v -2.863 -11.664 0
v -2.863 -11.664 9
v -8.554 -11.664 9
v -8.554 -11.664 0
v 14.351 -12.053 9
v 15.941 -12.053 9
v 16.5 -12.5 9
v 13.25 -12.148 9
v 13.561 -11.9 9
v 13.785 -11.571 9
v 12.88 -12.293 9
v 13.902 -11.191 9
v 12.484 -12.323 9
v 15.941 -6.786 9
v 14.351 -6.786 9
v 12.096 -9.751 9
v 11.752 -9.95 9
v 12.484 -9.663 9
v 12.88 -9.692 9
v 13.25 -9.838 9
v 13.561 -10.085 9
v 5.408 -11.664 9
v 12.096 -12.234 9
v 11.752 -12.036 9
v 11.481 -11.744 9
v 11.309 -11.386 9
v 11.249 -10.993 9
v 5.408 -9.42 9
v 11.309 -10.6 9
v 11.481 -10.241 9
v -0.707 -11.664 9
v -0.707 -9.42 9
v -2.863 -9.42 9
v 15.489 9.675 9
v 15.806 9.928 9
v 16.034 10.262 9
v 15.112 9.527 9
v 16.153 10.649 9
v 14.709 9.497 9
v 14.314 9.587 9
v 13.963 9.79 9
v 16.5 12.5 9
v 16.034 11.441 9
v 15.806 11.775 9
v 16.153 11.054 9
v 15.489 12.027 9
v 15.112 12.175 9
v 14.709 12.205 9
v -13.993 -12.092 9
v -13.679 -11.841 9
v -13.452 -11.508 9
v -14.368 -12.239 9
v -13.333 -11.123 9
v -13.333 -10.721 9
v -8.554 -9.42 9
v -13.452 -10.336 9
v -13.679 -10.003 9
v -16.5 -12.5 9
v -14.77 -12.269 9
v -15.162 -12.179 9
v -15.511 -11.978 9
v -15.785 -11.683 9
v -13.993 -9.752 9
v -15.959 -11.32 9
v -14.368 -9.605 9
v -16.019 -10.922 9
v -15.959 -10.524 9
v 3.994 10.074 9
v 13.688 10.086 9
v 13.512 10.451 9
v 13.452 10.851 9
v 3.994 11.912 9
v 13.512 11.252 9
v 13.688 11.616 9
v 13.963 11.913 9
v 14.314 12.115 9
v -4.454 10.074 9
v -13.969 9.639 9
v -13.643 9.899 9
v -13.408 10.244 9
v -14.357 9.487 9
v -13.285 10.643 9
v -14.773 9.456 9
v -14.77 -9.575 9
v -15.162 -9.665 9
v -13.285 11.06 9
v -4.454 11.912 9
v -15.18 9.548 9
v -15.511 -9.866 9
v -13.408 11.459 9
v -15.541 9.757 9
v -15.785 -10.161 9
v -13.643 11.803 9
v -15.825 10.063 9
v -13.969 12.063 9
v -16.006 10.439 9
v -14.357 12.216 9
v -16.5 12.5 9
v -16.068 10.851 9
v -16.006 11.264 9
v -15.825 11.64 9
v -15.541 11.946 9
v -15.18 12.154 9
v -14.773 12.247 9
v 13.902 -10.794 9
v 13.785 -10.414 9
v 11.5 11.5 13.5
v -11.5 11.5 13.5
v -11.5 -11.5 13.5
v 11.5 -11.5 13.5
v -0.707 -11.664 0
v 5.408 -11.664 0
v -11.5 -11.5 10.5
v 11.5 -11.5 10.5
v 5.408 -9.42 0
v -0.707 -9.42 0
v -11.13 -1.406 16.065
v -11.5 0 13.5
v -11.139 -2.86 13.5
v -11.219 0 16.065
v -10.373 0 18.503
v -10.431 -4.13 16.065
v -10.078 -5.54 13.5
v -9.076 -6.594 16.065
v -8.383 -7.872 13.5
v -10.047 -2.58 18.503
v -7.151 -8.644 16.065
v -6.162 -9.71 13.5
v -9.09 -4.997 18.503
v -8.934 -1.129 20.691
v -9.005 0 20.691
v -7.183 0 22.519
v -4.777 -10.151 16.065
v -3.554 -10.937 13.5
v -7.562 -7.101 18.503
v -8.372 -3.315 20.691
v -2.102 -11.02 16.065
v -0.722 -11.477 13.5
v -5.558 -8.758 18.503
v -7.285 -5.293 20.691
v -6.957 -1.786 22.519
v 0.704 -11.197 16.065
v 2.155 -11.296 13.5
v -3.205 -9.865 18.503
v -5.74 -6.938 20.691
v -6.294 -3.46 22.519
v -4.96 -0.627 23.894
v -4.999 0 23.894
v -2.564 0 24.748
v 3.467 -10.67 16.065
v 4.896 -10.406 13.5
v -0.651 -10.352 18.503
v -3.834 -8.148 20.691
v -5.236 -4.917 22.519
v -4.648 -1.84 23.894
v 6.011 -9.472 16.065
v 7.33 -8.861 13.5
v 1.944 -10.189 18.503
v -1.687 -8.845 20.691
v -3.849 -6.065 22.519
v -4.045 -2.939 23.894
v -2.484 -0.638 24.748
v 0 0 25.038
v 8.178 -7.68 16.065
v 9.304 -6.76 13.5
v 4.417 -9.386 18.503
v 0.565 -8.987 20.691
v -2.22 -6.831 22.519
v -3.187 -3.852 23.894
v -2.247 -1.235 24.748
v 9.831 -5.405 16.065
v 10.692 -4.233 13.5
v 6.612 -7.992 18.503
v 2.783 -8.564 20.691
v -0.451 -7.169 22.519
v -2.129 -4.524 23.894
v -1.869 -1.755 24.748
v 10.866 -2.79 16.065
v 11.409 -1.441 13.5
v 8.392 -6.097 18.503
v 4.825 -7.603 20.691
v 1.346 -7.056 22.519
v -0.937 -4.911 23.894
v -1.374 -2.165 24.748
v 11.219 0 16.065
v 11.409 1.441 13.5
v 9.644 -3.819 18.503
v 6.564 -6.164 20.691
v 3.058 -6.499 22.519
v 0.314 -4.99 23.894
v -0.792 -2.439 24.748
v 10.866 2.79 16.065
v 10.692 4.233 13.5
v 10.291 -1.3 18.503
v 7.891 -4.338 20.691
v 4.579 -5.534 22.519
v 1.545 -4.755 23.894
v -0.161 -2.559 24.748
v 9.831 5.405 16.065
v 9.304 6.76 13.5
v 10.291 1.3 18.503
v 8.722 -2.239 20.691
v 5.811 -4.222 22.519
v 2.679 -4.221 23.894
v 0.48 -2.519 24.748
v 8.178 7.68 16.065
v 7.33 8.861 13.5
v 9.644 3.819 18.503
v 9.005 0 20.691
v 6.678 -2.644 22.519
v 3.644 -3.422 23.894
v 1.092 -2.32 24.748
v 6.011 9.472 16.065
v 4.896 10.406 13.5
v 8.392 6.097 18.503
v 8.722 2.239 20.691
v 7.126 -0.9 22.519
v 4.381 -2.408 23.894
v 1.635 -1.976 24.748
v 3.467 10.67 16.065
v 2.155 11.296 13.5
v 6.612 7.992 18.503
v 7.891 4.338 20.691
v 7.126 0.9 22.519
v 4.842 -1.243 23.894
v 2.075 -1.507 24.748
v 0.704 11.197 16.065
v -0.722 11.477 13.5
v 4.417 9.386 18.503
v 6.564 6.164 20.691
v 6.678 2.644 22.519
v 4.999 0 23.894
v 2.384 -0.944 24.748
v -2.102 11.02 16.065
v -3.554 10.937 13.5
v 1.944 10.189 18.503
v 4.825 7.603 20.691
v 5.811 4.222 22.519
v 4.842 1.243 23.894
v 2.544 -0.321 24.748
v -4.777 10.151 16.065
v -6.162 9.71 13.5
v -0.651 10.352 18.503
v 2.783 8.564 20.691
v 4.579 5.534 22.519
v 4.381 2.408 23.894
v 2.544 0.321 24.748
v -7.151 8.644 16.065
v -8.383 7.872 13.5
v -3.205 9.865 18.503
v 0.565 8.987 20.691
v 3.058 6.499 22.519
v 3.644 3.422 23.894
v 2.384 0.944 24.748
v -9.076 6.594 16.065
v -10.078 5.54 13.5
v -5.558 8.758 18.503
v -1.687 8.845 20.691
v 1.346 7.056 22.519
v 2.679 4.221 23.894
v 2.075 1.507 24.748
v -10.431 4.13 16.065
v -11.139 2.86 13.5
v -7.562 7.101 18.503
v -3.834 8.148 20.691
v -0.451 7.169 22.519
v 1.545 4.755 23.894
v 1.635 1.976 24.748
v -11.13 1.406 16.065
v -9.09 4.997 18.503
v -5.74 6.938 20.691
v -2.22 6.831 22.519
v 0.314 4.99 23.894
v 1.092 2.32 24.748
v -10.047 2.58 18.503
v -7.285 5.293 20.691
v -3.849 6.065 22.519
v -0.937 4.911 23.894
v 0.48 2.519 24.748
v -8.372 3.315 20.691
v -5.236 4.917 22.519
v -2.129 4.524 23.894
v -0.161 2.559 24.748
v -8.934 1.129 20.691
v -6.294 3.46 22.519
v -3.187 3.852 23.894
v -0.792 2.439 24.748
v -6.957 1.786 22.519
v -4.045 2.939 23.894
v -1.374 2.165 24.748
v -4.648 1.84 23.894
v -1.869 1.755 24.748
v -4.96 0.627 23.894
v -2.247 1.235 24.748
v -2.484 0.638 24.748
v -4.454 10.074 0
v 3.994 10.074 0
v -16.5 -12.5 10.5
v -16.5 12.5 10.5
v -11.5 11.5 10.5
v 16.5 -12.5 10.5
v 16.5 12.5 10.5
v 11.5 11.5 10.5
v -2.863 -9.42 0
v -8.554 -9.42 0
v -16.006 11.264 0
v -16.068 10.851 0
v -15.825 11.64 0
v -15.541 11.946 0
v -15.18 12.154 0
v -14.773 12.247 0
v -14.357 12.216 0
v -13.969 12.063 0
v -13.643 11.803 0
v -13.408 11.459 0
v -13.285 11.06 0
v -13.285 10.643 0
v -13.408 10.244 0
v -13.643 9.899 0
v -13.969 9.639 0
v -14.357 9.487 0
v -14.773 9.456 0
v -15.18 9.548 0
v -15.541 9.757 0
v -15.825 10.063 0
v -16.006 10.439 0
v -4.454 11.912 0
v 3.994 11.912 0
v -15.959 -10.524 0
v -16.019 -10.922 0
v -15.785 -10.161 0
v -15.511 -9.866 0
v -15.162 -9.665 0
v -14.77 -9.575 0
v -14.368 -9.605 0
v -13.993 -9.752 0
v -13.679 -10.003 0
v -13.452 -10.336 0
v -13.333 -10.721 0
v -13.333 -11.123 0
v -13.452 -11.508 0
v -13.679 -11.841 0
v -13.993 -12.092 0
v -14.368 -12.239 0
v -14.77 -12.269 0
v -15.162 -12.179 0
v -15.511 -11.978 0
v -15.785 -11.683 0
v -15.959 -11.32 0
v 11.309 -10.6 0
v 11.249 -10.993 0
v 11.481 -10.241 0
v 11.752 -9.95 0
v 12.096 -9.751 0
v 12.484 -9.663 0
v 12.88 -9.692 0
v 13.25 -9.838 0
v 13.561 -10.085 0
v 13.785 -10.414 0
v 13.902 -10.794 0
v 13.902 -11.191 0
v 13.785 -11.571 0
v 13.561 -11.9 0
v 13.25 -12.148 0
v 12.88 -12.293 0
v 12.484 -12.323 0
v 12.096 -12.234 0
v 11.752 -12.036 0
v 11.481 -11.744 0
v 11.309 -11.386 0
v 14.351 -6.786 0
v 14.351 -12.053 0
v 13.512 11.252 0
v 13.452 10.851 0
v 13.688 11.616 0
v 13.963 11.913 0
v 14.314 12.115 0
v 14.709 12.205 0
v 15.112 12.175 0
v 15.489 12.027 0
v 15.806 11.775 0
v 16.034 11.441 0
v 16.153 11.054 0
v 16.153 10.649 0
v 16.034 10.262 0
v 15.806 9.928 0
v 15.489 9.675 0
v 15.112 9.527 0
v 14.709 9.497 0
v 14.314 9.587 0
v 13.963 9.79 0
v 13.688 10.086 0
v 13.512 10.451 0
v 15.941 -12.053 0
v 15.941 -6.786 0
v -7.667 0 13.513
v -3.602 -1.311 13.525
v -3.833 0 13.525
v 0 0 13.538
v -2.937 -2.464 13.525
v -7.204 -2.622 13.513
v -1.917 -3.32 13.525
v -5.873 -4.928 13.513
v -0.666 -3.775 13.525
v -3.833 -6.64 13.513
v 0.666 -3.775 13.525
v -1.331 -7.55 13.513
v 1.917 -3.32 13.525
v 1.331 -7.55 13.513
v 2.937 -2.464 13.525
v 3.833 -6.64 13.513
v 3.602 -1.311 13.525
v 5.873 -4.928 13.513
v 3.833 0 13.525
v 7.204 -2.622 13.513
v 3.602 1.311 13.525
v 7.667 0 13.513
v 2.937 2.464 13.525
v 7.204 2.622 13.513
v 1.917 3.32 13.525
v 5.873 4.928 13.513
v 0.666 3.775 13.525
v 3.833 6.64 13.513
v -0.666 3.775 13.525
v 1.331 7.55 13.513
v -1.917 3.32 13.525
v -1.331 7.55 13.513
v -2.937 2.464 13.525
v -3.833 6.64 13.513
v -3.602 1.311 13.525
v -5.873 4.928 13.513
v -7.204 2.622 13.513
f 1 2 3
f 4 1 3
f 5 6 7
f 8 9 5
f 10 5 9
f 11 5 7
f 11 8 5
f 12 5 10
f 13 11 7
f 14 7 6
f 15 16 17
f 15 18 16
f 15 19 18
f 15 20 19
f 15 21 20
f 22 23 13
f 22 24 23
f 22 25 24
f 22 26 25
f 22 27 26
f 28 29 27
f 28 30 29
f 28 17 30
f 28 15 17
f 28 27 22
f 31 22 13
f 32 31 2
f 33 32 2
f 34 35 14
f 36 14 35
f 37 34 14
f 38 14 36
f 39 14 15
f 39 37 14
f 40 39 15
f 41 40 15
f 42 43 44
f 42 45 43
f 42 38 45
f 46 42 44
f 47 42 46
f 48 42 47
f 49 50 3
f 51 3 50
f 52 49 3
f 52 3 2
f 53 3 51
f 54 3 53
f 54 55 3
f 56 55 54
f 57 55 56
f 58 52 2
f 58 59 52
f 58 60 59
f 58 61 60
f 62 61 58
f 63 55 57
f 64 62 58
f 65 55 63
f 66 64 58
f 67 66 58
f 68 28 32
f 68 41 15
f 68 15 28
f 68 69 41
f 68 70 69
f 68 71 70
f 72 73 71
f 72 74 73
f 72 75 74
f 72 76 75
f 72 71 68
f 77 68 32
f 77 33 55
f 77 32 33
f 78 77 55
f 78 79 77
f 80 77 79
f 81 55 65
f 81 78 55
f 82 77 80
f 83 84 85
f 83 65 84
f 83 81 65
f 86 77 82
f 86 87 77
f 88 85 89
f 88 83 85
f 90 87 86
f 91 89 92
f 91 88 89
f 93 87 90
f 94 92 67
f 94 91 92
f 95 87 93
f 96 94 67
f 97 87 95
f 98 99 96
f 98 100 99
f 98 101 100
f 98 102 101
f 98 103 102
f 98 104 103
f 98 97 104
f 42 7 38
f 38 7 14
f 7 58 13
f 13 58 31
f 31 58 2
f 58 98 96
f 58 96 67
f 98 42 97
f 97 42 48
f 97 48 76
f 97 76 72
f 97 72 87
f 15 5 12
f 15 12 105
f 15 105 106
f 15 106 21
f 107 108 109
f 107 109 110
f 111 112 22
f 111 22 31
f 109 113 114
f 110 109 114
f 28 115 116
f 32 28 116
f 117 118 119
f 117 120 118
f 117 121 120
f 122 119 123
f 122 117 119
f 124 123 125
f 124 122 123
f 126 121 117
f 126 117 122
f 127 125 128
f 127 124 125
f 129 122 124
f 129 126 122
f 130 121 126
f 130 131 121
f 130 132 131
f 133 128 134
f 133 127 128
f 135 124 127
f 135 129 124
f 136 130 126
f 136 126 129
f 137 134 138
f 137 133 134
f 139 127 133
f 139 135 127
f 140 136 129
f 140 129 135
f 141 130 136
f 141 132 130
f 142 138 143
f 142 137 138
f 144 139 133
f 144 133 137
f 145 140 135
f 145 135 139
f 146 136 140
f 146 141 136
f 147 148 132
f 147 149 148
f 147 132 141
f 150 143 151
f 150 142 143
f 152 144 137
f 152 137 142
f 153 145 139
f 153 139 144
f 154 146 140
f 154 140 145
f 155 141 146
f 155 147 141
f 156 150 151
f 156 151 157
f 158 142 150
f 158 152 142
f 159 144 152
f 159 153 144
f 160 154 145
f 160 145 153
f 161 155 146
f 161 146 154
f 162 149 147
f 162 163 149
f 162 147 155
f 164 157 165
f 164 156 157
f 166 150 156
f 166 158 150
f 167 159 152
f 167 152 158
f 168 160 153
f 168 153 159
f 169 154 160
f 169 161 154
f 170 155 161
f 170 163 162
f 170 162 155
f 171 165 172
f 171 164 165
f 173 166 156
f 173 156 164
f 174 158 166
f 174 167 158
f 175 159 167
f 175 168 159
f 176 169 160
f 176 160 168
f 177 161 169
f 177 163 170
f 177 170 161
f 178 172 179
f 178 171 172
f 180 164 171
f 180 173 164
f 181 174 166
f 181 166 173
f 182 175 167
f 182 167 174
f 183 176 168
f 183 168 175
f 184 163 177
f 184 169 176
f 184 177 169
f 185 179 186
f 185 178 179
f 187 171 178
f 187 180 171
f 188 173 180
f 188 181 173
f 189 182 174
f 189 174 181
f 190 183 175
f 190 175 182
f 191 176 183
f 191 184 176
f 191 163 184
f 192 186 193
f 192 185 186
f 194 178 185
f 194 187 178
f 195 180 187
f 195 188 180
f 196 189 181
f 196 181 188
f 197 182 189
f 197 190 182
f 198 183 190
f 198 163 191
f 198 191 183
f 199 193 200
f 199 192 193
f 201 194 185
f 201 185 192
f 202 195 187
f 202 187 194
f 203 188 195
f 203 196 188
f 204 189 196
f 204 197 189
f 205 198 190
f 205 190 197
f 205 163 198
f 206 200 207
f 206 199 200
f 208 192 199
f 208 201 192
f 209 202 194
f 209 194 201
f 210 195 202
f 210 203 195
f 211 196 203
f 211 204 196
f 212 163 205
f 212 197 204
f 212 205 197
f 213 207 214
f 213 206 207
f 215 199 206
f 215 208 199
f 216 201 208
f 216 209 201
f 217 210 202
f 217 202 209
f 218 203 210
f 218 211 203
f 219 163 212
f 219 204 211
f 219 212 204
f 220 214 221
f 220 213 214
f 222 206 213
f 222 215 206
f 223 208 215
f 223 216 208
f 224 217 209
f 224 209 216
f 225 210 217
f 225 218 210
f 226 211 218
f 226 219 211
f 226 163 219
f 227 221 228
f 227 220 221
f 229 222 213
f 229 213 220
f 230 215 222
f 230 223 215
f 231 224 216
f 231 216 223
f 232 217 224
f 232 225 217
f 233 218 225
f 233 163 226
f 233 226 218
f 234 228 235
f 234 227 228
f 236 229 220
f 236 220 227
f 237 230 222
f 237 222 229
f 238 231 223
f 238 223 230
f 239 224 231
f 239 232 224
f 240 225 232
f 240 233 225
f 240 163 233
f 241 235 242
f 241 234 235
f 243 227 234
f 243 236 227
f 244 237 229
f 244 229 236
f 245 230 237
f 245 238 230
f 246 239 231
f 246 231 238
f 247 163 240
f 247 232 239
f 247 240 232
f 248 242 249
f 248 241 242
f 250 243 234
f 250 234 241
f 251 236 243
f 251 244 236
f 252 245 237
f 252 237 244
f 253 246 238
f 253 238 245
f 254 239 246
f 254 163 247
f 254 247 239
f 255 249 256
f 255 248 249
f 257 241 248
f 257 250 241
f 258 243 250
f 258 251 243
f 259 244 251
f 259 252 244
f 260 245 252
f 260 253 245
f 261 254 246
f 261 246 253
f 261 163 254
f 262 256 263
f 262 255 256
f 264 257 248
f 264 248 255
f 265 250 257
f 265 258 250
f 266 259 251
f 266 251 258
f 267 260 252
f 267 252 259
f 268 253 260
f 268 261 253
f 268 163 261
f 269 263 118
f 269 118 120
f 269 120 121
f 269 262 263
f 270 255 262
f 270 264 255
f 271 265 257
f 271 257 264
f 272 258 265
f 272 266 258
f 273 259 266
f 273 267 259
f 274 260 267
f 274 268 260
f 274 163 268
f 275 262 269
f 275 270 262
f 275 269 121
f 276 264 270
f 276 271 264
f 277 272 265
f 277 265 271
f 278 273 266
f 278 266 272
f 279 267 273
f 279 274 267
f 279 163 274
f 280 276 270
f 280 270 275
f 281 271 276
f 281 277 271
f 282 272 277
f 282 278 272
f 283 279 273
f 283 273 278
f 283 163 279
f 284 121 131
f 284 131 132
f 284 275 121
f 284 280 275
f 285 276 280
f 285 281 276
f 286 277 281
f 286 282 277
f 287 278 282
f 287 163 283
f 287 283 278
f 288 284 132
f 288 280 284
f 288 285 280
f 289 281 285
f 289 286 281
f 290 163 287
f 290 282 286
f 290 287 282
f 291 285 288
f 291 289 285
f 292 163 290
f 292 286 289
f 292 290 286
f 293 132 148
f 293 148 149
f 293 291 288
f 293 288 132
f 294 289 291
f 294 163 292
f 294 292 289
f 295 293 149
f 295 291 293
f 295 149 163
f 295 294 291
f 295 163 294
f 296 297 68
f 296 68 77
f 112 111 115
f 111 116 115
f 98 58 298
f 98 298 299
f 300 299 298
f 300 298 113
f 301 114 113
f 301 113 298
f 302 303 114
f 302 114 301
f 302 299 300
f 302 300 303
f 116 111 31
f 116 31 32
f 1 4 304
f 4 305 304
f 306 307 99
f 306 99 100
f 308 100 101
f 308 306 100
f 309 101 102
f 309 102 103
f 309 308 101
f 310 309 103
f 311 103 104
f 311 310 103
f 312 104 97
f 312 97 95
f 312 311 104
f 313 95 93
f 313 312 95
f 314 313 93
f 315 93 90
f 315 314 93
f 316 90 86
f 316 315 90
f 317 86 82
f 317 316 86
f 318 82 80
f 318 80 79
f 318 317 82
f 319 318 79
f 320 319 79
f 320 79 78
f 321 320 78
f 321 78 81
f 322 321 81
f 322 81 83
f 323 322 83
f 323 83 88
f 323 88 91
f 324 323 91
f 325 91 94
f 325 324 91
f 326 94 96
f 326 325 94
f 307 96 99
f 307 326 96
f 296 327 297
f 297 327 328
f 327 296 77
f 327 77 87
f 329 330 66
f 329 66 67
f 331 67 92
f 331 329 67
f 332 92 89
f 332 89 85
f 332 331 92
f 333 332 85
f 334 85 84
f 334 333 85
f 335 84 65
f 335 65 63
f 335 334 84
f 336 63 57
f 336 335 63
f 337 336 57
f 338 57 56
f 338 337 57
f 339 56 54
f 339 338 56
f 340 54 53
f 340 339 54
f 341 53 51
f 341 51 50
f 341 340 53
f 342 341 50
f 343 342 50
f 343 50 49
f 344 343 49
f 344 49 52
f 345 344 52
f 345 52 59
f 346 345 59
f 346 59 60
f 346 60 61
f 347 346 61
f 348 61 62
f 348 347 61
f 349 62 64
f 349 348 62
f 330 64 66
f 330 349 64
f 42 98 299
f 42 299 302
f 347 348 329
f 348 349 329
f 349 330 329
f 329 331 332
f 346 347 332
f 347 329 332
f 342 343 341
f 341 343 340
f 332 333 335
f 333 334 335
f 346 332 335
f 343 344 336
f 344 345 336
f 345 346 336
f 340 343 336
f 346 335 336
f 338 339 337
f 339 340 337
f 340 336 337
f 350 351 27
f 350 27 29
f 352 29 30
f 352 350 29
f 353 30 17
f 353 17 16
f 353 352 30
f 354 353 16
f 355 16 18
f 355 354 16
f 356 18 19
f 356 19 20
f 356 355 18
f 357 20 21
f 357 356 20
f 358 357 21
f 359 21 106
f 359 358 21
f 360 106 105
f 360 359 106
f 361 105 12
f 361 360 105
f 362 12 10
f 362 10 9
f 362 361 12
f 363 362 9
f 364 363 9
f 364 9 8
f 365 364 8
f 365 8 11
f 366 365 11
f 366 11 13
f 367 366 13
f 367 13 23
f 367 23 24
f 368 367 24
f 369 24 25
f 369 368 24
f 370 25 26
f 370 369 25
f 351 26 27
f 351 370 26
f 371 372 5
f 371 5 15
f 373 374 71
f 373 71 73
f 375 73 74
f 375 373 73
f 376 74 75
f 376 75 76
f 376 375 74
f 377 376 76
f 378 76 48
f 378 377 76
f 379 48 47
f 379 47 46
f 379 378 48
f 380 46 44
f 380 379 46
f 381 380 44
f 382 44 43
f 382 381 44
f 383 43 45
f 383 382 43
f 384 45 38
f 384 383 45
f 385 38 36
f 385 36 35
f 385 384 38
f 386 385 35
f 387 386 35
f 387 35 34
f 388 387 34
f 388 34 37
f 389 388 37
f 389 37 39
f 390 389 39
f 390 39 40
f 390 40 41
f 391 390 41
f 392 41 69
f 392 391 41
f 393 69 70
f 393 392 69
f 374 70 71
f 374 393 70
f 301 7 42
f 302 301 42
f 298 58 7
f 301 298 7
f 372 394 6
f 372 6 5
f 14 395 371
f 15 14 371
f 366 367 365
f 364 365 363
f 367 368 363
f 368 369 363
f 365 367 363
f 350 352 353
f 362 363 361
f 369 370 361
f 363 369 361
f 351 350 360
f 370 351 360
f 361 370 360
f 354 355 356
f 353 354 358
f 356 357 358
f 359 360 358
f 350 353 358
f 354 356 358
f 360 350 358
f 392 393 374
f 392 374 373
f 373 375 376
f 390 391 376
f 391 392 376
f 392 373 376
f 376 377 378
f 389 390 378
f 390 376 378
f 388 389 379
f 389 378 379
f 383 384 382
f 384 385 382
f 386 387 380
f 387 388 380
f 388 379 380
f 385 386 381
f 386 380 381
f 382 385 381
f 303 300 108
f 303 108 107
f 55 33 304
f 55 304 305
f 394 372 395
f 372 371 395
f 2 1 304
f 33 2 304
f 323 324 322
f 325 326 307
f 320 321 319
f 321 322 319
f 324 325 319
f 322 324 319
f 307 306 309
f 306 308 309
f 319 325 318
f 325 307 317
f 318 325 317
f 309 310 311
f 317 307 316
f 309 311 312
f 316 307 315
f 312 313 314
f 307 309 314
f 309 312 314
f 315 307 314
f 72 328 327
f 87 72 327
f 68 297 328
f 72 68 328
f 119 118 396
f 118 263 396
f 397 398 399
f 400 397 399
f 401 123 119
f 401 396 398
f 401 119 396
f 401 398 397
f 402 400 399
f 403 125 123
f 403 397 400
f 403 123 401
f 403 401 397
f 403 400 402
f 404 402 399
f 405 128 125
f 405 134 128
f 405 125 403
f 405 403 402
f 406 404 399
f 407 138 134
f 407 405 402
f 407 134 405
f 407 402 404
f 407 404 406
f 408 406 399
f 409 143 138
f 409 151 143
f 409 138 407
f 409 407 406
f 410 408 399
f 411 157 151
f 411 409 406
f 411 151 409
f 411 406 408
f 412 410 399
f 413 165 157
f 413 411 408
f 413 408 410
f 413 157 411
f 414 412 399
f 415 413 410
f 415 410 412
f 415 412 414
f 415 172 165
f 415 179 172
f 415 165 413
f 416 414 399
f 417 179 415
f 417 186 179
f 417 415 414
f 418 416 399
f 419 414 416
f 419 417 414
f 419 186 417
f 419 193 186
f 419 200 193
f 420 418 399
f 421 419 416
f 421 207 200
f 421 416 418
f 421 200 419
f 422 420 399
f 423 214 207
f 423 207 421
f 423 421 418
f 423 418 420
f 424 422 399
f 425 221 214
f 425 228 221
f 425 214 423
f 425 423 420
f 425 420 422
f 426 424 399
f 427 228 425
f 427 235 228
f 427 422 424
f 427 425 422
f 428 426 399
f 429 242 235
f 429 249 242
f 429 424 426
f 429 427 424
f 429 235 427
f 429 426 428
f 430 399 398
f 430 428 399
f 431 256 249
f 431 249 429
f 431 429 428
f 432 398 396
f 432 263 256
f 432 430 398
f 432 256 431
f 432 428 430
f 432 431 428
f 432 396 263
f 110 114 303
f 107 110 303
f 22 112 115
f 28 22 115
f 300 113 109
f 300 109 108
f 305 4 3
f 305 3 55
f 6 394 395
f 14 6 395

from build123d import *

# Parameters (mm, degrees)
SKETCH_1_W          = 33
SKETCH_1_H          = 25
EXTRUDE_1_DEPTH     = 10.5
SKETCH_2_W          = 23
SKETCH_2_H          = 23
EXTRUDE_2_DEPTH     = 3
SKETCH_4_W          = 33
SKETCH_4_H          = 25
SKETCH_4_R          = 1.35795949
SKETCH_4_R_2        = 1.399641029
SKETCH_4_R_3        = 1.333824315
SKETCH_4_R_4        = 1.35057922
SKETCH_4_W_2        = 8.447759406
SKETCH_4_H_2        = 1.838006231
SKETCH_4_W_3        = 1.590582314
SKETCH_4_H_3        = 5.266594776
SKETCH_4_W_4        = 6.114905344
SKETCH_4_H_4        = 2.244488378
SKETCH_4_W_5        = 5.69075006
CUT_EXTRUDE_1_DEPTH = 9


with BuildPart() as part:
    # Эскиз1 → Бобышка-Вытянуть1 (new body)
    with BuildSketch(Plane.XY):
        Rectangle(SKETCH_1_W, SKETCH_1_H)
    extrude(amount=EXTRUDE_1_DEPTH)

    # Эскиз2 → Бобышка-Вытянуть2 (add)
    with BuildSketch(Plane.XY.offset(10.5)):
        Rectangle(SKETCH_2_W, SKETCH_2_H)
    extrude(amount=EXTRUDE_2_DEPTH)

    # Эскиз4 → Вырез-Вытянуть1 (cut)
    with BuildSketch(Plane(origin=(0, 0, 0), x_dir=(-1, 0, 0), z_dir=(0, 0, -1))):
        Rectangle(SKETCH_4_W, SKETCH_4_H)
        with Locations((-14.810088665, 10.851306015)):
            Circle(SKETCH_4_R, mode=Mode.SUBTRACT)
        with Locations((14.668703571, 10.851306015)):
            Circle(SKETCH_4_R_2, mode=Mode.SUBTRACT)
        with Locations((-12.583273424, -10.99269111)):
            Circle(SKETCH_4_R_3, mode=Mode.SUBTRACT)
        with Locations((14.668703571, -10.921998562)):
            Circle(SKETCH_4_R_4, mode=Mode.SUBTRACT)
        with Locations((0.229750779, 10.99269111)):
            Rectangle(SKETCH_4_W_2, SKETCH_4_H_2, mode=Mode.SUBTRACT)
        with Locations((-15.145878265, -9.419781931)):
            Rectangle(SKETCH_4_W_3, SKETCH_4_H_3, mode=Mode.SUBTRACT)
        with Locations((-2.350527199, -10.54202612)):
            Rectangle(SKETCH_4_W_4, SKETCH_4_H_4, mode=Mode.SUBTRACT)
        with Locations((5.708423197, -10.54202612)):
            Rectangle(SKETCH_4_W_5, SKETCH_4_H_4, mode=Mode.SUBTRACT)
    extrude(amount=-CUT_EXTRUDE_1_DEPTH, mode=Mode.SUBTRACT)


with BuildPart() as body_2:
    # Эскиз3 → Повернуть1 (revolve)
    with BuildSketch(Plane(origin=(0, 0, 0), x_dir=(0, 0, -1), z_dir=(1, 0, 0)), mode=Mode.PRIVATE) as revolve_1_sk:
        with BuildLine():
            Line((-25.037873178, 0), (-13.537811019, 0))
            Line((-13.537811019, 0), (-13.5, 11.5))
            ThreePointArc((-13.5, 11.5), (-21.656203736, 8.145129181), (-25.037873178, 0))
        make_face()
    revolve(revolve_1_sk.sketch.rotate(Axis((0, 0, -2.745901425), (0, 0, 1)), 90), axis=Axis((0, 0, -2.745901425), (0, 0, 1)))


solid = Compound([part.part, body_2.part])
